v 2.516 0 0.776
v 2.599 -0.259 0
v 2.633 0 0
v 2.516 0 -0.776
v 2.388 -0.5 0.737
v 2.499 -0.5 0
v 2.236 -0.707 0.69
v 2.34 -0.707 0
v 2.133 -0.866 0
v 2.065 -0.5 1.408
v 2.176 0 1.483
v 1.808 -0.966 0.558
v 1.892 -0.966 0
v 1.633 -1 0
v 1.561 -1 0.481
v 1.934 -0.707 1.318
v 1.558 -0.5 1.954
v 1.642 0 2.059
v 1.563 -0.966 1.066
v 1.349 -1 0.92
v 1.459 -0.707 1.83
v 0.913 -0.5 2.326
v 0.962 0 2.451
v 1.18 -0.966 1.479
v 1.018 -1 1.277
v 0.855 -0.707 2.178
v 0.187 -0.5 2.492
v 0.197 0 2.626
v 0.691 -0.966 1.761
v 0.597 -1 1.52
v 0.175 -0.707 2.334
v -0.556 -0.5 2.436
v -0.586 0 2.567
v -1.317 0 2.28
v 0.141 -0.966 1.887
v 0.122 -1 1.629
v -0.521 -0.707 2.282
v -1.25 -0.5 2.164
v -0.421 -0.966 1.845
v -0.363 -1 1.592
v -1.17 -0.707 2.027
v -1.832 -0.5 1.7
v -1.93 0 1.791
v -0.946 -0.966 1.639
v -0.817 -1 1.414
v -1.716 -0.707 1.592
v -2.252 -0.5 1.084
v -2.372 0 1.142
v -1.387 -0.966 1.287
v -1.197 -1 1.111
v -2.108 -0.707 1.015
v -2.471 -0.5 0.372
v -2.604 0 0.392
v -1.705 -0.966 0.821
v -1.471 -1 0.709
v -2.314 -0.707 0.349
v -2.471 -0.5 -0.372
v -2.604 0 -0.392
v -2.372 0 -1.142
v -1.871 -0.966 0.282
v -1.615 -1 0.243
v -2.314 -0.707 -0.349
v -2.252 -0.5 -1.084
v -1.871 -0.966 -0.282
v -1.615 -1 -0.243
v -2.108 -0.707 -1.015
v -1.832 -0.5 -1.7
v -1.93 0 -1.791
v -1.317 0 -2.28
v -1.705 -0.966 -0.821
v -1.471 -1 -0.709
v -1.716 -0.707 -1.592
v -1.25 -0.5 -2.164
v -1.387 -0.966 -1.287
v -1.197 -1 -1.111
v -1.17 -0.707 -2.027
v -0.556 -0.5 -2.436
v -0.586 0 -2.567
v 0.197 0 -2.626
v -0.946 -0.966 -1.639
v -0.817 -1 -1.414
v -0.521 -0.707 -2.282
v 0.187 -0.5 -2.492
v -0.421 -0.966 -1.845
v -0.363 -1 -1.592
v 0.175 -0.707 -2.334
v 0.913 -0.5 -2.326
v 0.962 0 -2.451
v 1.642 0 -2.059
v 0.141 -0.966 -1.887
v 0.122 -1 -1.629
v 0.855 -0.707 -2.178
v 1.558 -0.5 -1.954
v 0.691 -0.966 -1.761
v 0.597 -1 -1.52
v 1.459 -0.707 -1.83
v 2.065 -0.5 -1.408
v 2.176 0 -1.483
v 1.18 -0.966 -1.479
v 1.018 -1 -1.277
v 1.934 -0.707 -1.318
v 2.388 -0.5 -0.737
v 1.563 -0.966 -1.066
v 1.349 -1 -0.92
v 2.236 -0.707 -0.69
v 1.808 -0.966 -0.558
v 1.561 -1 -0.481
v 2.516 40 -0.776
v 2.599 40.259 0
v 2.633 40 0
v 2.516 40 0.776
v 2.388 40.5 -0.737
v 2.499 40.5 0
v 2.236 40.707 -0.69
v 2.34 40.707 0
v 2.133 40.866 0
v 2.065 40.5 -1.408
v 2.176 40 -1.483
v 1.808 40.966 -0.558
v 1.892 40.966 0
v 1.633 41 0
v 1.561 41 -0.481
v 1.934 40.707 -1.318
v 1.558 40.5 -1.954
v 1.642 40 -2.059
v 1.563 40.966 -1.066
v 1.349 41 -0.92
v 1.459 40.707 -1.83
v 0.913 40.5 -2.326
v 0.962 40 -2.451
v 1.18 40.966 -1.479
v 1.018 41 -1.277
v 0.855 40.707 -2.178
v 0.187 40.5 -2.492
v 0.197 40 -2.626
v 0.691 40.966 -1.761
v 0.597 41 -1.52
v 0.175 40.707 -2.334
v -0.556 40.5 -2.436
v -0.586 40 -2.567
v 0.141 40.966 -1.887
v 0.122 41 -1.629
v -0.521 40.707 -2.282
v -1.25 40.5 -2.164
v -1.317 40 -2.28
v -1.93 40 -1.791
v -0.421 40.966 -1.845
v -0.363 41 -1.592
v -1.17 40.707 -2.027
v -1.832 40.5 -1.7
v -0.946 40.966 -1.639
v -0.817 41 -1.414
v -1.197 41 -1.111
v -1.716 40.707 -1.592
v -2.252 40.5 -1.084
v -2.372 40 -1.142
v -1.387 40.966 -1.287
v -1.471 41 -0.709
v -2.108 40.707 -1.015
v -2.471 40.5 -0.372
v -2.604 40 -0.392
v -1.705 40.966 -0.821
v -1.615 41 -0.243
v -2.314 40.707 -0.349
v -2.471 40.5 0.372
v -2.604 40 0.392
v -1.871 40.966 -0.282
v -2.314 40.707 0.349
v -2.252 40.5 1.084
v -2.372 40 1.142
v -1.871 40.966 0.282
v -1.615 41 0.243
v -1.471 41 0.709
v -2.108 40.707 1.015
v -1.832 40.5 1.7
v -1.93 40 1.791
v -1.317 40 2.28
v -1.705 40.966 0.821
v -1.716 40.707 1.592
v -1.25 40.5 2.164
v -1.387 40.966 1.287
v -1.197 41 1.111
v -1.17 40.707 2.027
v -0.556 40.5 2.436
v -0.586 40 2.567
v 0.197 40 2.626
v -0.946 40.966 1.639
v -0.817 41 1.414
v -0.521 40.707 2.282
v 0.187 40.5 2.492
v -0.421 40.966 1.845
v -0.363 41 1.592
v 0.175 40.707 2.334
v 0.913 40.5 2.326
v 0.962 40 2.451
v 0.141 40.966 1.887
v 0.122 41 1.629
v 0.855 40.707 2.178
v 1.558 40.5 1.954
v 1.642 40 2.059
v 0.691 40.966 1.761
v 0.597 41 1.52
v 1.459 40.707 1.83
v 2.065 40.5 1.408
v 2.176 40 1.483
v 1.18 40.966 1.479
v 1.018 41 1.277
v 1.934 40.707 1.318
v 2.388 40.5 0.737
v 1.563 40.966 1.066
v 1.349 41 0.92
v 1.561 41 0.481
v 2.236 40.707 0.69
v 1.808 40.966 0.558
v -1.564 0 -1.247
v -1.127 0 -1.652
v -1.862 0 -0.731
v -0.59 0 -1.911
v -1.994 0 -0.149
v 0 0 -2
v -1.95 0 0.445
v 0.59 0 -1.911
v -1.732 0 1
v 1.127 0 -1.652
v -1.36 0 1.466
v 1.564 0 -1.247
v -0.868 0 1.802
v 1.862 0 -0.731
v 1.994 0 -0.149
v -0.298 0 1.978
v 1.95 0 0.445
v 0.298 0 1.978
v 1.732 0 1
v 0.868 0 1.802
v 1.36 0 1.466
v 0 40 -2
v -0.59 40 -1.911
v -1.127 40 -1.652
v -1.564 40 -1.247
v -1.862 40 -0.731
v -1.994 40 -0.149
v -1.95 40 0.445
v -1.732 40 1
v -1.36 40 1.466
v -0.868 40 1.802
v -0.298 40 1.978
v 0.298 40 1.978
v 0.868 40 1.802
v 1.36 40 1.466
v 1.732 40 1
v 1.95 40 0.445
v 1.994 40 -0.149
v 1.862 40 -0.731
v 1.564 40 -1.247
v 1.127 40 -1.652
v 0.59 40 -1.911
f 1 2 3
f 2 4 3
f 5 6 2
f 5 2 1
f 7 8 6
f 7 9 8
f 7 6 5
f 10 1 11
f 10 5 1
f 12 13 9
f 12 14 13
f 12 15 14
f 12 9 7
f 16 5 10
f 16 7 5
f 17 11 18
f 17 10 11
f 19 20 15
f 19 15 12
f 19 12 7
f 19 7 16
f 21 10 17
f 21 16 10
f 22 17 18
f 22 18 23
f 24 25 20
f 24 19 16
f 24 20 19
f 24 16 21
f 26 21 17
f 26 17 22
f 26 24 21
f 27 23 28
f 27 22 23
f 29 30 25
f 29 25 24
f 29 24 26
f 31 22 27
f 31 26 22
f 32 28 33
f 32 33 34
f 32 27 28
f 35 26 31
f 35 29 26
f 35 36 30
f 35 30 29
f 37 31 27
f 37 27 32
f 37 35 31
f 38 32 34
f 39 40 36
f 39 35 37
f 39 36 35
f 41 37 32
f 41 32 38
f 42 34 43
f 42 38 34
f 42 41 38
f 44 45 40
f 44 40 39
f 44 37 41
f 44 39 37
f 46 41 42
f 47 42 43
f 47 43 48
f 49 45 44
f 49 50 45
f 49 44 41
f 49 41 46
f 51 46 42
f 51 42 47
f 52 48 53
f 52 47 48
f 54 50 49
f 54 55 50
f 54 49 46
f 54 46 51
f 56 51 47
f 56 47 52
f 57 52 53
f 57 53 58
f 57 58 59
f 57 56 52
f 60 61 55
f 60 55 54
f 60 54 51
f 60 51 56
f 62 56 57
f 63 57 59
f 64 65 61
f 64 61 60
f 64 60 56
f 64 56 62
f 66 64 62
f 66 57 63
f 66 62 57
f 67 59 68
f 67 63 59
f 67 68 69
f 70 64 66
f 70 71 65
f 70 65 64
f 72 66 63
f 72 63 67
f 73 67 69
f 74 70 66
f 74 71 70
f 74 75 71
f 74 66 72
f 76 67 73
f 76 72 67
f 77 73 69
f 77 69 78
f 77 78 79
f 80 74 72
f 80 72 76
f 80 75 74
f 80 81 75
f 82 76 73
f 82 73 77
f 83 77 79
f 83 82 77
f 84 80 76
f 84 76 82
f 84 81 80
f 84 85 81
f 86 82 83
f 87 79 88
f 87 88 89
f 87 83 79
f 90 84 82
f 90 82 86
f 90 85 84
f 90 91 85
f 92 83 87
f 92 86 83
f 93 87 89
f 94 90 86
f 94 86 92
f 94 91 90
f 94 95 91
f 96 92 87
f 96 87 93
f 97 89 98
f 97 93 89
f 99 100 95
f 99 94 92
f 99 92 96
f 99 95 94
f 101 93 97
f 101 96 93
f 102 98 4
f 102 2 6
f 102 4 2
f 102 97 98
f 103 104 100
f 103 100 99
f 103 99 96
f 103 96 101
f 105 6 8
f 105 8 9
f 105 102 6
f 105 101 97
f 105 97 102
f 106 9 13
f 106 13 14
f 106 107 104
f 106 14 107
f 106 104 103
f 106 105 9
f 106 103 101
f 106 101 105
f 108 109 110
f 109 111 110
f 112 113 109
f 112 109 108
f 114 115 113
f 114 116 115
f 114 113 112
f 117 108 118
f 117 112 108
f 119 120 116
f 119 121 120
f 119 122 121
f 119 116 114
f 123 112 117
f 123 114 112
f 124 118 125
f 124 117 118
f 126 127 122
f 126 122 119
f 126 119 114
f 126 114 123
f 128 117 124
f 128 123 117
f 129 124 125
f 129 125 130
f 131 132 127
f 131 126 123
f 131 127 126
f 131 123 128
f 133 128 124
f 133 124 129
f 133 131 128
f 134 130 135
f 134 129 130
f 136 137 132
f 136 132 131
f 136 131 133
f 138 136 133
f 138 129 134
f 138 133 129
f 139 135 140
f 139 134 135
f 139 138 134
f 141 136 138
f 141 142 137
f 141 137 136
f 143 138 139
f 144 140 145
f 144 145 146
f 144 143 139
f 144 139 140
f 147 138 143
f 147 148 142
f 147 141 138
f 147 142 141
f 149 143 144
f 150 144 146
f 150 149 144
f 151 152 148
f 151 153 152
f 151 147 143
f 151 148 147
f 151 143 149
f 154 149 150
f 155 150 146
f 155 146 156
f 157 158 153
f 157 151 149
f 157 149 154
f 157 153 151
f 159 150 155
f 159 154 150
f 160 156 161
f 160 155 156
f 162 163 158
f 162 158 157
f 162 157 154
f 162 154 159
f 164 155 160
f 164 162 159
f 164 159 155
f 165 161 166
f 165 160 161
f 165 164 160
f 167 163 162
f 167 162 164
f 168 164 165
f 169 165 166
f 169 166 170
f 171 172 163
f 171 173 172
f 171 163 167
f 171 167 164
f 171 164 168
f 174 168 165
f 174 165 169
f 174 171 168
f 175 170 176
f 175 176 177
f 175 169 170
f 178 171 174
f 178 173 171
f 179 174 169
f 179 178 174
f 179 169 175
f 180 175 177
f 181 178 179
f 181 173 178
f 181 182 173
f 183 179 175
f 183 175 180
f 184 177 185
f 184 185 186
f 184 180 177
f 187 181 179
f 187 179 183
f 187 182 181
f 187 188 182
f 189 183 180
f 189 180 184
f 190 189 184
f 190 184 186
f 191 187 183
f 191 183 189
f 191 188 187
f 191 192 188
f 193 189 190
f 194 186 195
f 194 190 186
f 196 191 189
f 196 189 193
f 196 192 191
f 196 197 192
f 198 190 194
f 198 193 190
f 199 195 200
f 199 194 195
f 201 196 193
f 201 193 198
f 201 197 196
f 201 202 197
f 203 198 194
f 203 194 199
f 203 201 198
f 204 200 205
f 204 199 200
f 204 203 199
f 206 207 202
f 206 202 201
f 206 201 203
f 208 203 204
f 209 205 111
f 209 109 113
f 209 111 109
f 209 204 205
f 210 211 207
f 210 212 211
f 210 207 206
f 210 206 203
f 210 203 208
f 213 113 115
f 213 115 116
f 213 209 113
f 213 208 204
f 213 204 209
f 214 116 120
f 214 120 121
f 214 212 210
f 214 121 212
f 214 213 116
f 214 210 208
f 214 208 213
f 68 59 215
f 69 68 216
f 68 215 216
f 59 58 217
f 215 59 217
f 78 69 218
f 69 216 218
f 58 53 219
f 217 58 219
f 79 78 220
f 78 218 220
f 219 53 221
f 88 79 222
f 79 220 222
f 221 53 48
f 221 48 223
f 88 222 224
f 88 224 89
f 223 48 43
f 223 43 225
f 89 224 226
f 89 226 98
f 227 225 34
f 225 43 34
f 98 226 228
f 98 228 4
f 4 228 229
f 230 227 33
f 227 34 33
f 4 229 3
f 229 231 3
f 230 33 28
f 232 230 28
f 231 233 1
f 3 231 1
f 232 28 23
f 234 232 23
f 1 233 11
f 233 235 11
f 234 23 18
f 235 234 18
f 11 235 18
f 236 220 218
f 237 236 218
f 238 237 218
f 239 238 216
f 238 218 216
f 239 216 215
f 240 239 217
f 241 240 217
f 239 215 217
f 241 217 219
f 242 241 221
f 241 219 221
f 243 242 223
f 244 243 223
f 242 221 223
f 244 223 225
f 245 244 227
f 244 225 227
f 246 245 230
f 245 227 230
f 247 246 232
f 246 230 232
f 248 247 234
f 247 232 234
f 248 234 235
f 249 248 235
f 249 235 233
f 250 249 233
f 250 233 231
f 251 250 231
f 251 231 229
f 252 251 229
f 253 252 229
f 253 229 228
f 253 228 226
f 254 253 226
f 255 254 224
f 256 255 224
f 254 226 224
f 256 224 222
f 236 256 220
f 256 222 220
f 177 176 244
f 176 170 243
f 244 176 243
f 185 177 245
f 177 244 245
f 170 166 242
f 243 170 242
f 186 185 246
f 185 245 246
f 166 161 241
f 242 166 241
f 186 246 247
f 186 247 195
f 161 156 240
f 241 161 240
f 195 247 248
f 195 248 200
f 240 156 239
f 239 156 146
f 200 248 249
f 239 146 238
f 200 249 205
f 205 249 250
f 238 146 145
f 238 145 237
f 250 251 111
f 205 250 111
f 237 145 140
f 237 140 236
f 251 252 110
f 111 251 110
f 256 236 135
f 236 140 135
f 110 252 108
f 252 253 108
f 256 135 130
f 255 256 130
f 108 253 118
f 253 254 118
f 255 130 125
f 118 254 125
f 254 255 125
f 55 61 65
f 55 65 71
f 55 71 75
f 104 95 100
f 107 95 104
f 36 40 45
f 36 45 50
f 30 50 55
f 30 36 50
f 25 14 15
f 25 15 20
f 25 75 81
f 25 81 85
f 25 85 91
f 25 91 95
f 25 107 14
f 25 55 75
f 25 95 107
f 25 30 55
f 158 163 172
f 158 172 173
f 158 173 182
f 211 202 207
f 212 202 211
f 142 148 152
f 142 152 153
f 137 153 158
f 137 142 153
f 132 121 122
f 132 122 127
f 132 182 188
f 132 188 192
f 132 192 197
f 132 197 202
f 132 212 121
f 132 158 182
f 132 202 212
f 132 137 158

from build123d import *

# Parameters (mm, degrees)
SKETCH1_R           = 2
BOSS_EXTRUDE1_DEPTH = 40
SKETCH2_R           = 2.633085966
BOSS_EXTRUDE2_DEPTH = 1
FILLET1_R           = 1
BOSS_EXTRUDE3_START = 1
SKETCH3_R           = 2.633085966
BOSS_EXTRUDE3_DEPTH = 1
FILLET2_R           = 1


with BuildPart() as part:
    # Sketch1 → Boss-Extrude1 (new body)
    with BuildSketch(Plane(origin=(0, 0, 0), x_dir=(1, 0, 0), z_dir=(0, 1, 0))):
        with Locations(Location((0, 0, 0), (0, 0, 90))):
            Circle(SKETCH1_R)
    extrude(amount=BOSS_EXTRUDE1_DEPTH)

    # Sketch2 → Boss-Extrude2 (add)
    with BuildSketch(Plane(origin=(0, 40, 0), x_dir=(1, 0, 0), z_dir=(0, 1, 0))):
        Circle(SKETCH2_R)
    extrude(amount=BOSS_EXTRUDE2_DEPTH)

    # Fillet1
    fillet1_edges = [part.edges().sort_by_distance(p)[0] for p in [
        (-2.633085966, 41, 0),
    ]]
    fillet(fillet1_edges, radius=FILLET1_R - 0.0001)  # a hair under: the kernel refuses the full size

    # Sketch3 → Boss-Extrude3 (add)
    with BuildSketch(Plane.XZ.offset(BOSS_EXTRUDE3_START)):
        Circle(SKETCH3_R)
    extrude(amount=-BOSS_EXTRUDE3_DEPTH)

    # Fillet2
    fillet2_edges = [part.edges().sort_by_distance(p)[0] for p in [
        (-2.633085966, -1, 0),
    ]]
    fillet(fillet2_edges, radius=FILLET2_R - 0.0001)  # a hair under: the kernel refuses the full size


solid = part.part
